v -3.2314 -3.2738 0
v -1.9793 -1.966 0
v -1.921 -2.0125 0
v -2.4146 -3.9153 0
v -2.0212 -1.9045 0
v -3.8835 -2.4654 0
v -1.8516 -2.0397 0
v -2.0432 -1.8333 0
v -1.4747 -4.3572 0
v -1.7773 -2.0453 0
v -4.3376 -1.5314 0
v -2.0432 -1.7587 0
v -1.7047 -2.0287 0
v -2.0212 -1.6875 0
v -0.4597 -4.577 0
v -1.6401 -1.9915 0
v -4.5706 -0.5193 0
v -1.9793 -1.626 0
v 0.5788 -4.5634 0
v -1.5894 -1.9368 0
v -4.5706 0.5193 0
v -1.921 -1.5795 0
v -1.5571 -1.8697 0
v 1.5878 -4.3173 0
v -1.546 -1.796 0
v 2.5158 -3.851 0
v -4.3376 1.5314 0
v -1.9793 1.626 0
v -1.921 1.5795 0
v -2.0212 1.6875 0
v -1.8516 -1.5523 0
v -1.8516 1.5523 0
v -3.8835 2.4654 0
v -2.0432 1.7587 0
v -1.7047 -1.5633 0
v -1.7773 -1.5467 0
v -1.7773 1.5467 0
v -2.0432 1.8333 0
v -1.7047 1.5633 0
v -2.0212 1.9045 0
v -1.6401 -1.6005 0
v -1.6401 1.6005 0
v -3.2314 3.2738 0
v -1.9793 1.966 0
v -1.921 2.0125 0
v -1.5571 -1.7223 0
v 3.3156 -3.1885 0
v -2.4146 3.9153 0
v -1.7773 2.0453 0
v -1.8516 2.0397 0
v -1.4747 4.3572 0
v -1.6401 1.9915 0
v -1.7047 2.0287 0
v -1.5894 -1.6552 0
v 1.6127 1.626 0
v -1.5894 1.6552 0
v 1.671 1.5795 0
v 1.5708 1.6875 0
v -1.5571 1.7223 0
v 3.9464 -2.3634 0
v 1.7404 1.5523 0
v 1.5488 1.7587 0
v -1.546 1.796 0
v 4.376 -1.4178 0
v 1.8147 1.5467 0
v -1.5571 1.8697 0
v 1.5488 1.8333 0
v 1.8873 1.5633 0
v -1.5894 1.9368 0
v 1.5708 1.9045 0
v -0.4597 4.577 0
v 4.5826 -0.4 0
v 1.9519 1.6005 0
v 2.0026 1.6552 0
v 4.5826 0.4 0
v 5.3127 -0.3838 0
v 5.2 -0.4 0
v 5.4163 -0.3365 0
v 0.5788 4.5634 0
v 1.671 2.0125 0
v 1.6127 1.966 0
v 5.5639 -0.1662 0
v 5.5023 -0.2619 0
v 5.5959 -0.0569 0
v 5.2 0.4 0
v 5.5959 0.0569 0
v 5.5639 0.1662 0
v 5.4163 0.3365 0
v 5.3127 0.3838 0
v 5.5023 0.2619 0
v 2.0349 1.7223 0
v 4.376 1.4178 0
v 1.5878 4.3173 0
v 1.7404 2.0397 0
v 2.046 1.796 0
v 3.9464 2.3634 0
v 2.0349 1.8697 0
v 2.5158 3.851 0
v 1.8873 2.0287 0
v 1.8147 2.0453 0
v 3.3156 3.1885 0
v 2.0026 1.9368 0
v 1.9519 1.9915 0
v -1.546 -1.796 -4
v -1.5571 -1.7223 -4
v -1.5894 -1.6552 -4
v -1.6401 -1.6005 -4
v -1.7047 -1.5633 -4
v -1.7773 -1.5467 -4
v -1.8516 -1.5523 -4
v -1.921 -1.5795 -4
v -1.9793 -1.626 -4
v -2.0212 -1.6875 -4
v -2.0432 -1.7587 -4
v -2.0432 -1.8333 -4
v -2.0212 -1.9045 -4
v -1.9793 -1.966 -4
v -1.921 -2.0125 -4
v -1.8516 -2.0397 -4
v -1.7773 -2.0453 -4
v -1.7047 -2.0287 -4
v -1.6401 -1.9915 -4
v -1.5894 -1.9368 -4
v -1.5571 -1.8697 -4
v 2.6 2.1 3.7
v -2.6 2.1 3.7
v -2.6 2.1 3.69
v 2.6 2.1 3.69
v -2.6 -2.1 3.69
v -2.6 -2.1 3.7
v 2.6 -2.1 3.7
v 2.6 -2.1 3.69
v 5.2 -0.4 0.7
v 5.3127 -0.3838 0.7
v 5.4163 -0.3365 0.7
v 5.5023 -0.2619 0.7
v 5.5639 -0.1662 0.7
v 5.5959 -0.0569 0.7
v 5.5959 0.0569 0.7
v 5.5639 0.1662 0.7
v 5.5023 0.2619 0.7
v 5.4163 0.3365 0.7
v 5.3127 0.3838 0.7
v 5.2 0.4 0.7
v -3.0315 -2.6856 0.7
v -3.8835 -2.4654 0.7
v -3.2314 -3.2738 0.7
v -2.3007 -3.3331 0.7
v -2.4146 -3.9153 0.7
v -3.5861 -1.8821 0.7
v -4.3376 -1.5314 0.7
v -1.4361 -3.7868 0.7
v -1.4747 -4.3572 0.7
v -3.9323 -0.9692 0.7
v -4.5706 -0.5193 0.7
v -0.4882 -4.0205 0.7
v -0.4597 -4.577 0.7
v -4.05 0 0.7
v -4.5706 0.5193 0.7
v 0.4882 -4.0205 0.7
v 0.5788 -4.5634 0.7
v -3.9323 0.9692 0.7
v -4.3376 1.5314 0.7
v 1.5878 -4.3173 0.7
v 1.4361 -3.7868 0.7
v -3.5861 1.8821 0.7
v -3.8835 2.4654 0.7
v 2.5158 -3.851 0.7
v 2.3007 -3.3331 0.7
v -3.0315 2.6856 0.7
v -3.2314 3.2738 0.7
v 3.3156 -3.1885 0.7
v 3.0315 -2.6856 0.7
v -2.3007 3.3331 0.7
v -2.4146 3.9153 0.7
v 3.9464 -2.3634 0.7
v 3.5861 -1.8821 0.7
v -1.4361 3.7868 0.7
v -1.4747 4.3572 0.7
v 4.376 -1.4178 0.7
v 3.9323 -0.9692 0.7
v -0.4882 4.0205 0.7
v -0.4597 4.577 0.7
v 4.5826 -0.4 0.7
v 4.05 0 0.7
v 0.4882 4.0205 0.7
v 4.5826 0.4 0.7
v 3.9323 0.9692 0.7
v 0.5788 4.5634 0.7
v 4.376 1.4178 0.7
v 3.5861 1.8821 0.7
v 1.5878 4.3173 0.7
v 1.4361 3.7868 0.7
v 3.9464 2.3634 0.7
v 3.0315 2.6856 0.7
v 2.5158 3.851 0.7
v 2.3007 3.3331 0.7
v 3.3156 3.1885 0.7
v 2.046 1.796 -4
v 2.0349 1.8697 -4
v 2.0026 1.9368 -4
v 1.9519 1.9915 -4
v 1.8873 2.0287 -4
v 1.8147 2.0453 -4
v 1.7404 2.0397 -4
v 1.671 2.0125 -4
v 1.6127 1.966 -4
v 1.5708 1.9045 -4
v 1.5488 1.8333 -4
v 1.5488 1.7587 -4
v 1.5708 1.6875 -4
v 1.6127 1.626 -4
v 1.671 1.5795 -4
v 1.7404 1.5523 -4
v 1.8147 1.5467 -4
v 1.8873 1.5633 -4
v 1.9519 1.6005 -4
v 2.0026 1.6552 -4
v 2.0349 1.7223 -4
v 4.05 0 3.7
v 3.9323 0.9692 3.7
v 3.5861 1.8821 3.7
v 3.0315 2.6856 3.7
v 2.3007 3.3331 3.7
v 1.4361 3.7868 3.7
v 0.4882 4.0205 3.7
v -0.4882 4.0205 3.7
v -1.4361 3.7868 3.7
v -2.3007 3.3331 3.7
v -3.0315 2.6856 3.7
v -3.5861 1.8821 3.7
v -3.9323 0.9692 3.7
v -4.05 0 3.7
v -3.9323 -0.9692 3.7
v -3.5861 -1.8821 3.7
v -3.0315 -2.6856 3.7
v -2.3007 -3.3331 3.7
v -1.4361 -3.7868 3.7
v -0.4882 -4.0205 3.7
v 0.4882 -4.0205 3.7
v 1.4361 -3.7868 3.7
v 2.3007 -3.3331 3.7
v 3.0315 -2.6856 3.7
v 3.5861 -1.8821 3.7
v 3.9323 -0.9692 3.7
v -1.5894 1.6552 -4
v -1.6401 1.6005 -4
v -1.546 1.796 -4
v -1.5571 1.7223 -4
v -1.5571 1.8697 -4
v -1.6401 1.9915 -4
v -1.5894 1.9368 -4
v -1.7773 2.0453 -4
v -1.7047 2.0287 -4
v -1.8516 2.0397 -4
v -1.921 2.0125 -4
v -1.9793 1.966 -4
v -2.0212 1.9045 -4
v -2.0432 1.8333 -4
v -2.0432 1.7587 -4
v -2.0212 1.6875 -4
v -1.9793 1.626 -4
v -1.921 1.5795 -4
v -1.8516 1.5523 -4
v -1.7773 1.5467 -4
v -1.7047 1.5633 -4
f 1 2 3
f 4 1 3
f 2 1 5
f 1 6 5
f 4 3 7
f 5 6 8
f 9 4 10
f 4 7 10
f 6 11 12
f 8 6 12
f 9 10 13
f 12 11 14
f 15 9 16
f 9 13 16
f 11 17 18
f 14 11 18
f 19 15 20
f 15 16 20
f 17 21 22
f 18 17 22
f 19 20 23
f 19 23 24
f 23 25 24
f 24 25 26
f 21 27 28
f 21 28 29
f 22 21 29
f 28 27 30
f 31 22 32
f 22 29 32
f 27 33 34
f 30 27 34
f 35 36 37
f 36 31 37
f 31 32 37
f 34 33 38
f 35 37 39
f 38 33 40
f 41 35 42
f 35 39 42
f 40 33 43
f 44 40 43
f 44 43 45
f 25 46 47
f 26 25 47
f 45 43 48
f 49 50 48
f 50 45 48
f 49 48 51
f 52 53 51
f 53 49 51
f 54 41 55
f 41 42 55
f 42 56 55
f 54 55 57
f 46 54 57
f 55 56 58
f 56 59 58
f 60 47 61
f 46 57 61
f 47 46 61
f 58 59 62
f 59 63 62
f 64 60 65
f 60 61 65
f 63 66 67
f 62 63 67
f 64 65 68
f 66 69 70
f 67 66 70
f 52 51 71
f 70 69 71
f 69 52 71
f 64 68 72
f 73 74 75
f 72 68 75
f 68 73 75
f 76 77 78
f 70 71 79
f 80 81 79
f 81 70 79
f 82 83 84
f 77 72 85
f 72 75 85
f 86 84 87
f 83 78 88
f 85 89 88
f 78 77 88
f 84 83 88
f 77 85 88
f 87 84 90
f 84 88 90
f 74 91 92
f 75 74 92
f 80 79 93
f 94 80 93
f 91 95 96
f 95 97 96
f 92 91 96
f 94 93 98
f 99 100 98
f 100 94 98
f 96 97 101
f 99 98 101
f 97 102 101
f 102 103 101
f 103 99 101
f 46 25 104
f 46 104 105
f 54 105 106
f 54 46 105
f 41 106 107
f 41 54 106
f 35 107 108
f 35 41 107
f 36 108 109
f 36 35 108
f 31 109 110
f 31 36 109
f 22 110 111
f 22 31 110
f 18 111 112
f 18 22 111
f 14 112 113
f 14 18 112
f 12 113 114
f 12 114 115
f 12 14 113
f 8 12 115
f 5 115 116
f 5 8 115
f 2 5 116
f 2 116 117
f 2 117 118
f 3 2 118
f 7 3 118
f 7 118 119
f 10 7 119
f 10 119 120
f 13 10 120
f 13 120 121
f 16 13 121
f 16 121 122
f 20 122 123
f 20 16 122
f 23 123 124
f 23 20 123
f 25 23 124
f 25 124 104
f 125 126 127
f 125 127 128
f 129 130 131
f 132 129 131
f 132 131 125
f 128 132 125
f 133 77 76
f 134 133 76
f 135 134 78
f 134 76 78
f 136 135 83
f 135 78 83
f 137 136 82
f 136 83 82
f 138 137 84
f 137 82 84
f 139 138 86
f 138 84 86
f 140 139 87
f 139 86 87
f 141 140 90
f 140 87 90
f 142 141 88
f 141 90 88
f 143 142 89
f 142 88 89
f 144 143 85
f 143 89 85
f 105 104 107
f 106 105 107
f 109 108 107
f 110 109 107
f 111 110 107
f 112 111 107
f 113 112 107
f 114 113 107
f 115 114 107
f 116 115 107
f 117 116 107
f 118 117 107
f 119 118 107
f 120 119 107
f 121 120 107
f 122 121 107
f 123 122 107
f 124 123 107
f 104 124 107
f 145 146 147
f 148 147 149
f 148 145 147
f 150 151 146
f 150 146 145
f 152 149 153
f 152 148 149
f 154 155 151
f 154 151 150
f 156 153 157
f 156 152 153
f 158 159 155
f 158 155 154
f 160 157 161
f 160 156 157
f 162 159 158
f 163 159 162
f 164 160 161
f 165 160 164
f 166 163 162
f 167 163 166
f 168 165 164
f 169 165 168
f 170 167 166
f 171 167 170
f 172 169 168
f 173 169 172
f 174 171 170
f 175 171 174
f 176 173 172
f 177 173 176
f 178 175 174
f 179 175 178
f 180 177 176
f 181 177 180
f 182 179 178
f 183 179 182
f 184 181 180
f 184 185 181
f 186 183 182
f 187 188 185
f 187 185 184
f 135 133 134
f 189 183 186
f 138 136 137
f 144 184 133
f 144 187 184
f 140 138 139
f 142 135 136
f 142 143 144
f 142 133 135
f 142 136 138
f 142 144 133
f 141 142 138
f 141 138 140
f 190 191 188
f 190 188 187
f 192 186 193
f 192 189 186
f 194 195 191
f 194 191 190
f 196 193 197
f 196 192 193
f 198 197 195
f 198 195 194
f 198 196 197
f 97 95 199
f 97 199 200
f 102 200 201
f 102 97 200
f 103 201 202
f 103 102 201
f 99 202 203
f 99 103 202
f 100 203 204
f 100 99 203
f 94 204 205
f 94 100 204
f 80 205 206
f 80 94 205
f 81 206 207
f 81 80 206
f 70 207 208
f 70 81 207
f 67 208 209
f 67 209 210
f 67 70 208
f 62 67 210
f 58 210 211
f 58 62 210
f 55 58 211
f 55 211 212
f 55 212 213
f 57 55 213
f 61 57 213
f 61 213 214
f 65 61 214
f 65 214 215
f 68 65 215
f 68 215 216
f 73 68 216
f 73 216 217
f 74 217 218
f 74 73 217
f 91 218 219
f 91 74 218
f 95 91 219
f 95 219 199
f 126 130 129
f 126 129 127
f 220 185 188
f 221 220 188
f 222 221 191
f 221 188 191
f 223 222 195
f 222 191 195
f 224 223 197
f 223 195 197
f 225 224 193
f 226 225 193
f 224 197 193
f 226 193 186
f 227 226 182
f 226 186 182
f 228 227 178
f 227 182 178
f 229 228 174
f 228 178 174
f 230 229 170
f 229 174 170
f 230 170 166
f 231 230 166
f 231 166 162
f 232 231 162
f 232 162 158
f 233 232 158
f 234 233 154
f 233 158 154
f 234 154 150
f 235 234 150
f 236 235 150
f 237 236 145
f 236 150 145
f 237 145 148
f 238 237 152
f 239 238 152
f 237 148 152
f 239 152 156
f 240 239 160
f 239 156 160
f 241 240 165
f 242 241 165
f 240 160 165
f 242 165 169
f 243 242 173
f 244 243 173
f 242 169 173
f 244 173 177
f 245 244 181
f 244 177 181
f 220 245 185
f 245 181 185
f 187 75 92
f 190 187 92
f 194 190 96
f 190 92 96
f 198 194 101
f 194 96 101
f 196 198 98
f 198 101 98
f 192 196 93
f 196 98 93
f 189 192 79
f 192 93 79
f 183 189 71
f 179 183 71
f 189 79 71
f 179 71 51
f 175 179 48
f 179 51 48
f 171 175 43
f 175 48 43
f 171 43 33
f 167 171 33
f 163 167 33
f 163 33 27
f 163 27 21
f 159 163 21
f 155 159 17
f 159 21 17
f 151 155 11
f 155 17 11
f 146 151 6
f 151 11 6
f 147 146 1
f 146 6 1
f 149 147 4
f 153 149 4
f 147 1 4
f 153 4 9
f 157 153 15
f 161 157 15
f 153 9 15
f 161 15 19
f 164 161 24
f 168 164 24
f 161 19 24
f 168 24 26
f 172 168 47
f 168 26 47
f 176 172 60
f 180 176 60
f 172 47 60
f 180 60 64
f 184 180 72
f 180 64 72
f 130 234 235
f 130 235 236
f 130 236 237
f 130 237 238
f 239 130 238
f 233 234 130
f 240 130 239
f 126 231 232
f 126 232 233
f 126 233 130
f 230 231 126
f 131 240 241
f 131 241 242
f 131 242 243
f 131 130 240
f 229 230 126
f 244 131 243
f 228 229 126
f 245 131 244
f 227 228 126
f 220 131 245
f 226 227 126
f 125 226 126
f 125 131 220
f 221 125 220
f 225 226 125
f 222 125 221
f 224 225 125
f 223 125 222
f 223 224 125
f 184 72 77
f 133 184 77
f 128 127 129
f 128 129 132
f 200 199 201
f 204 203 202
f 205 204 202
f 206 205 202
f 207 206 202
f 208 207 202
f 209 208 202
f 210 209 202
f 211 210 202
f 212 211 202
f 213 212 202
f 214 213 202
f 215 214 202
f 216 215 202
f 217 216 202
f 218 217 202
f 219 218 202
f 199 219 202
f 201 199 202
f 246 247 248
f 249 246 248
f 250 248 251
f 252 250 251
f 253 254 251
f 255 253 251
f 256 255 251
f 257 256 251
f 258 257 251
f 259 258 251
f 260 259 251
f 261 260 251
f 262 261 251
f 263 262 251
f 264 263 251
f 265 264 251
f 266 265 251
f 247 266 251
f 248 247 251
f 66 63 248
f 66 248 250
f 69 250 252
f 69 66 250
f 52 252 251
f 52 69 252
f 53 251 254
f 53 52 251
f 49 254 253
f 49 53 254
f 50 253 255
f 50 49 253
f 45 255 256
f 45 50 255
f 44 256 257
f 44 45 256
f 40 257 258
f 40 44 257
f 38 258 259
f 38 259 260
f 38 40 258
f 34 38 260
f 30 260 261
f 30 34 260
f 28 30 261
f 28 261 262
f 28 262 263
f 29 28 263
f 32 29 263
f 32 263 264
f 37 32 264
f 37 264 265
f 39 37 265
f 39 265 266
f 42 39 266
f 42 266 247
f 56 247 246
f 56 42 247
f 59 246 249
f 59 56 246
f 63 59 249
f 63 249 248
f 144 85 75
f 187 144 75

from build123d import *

# Parameters (mm, degrees)
EXTRUDE_1_DEPTH     = 0.7
SKETCH_2_R          = 4.05
EXTRUDE_2_DEPTH     = 3
SKETCH_3_W          = 5.2
SKETCH_3_H          = 4.2
CUT_EXTRUDE_1_DEPTH = 0.01
SKETCH_4_R          = 0.25
EXTRUDE_3_DEPTH     = 4


with BuildPart() as part:
    # Эскиз1 → Бобышка-Вытянуть1 (new body)
    with BuildSketch(Plane.XY):
        with BuildLine():
            Line((5.2, 0.4), (4.582575695, 0.4))
            ThreePointArc((4.582575695, 0.4), (-4.6, 0), (4.582575695, -0.4))
            Line((4.582575695, -0.4), (5.2, -0.4))
            ThreePointArc((5.2, -0.4), (5.6, 0), (5.2, 0.4))
        make_face()
    extrude(amount=EXTRUDE_1_DEPTH)

    # Эскиз2 → Бобышка-Вытянуть2 (add)
    with BuildSketch(Plane.XY.offset(0.7)):
        Circle(SKETCH_2_R)
    extrude(amount=EXTRUDE_2_DEPTH)

    # Эскиз3 → Вырез-Вытянуть1 (cut)
    with BuildSketch(Plane.XY.offset(3.7)):
        Rectangle(SKETCH_3_W, SKETCH_3_H)
    extrude(amount=-CUT_EXTRUDE_1_DEPTH, mode=Mode.SUBTRACT)

    # Эскиз4 → Бобышка-Вытянуть3 (add)
    with BuildSketch(Plane.XY):
        with Locations((1.796, 1.796)):
            Circle(SKETCH_4_R)
        with Locations((-1.796, 1.796)):
            Circle(SKETCH_4_R)
        with Locations((-1.796, -1.796)):
            Circle(SKETCH_4_R)
    extrude(amount=-EXTRUDE_3_DEPTH)


solid = part.part
